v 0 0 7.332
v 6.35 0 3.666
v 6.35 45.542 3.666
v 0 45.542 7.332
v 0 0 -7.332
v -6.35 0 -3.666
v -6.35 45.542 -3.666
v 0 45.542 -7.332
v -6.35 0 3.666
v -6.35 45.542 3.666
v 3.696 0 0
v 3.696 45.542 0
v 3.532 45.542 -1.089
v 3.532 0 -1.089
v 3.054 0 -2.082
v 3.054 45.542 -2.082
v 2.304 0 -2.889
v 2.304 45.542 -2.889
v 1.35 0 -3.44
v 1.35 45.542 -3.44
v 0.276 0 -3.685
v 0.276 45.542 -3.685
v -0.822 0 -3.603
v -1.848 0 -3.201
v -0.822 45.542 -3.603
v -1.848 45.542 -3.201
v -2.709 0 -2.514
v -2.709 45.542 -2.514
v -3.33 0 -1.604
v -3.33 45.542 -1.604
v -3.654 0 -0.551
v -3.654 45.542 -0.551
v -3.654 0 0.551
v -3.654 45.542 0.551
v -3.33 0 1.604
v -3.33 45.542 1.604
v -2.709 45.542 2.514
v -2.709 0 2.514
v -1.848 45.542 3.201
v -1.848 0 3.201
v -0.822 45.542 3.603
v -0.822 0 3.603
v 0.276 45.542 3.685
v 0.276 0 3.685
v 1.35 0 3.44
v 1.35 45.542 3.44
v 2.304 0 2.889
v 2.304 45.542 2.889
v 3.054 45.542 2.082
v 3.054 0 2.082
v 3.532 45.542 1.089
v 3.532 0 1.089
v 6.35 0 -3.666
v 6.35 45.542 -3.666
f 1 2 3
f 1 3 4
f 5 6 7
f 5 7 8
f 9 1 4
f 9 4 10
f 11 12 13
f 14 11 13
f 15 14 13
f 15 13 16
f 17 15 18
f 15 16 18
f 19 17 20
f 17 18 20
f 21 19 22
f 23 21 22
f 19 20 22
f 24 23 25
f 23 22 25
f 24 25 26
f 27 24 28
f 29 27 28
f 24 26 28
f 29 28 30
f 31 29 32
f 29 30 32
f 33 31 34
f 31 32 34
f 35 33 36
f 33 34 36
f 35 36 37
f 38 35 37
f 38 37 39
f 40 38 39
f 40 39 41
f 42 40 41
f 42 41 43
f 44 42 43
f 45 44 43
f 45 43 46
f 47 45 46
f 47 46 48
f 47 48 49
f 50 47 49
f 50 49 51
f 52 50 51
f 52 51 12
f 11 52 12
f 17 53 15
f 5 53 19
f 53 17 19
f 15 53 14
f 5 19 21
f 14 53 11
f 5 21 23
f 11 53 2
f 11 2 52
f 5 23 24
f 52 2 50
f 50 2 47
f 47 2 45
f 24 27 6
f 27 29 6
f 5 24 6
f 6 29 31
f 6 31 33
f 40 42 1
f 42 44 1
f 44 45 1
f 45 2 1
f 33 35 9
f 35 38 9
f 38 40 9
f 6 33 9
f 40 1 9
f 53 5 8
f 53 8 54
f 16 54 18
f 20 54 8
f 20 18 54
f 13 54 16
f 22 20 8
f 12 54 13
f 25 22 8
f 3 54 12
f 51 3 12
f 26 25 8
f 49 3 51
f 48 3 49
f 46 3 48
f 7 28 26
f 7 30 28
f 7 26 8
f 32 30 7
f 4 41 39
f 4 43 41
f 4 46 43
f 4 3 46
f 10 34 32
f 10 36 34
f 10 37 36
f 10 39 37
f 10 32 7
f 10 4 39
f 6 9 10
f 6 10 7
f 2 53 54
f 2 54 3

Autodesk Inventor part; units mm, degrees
ref_plane "YZ Plane" through (0, 0, 0) normal (1, 0, 0) x (0, 1, 0)
ref_plane "XZ Plane" through (0, 0, 0) normal (0, 1, 0) x (-1, 0, 0)
ref_plane "XY Plane" through (0, 0, 0) normal (0, 0, 1) x (1, 0, 0)
sketch "Sketch1" plane through (0, 0, 0) normal (0, 1, 0) x (-1, 0, 0)
  line L0 (0, -7.3323) -> (-6.35, -3.6662)
  line L1 (-6.35, -3.6662) -> (-6.35, 3.6662)
  line L2 (-6.35, 3.6662) -> (0, 7.3323)
  line L3 (0, 7.3323) -> (6.35, 3.6662)
  line L4 (6.35, 3.6662) -> (6.35, -3.6662)
  line L5 (6.35, -3.6662) -> (0, -7.3323)
  point P0 (0, 0)
  point P1 (0, 0)
  dimension "d0" = 12.7
extrude "Extrusion1" add sketch "Sketch1" along normal blind 45.5422
sketch "Sketch2" plane through (0, 45.5422, 0) normal (0, 1, 0) x (1, 0, 0)
  circle A0 centre (0, 0) radius 3.6957
  dimension "d3" = 7.3914
extrude "Extrusion2" cut sketch "Sketch2" against normal blind 45.5422
thread "Thread1" size "5/16-18 UNC" class "2B" standard "ANSI Unified Screw Threads" full length
properties part number "hexshaft_gearbox2"
